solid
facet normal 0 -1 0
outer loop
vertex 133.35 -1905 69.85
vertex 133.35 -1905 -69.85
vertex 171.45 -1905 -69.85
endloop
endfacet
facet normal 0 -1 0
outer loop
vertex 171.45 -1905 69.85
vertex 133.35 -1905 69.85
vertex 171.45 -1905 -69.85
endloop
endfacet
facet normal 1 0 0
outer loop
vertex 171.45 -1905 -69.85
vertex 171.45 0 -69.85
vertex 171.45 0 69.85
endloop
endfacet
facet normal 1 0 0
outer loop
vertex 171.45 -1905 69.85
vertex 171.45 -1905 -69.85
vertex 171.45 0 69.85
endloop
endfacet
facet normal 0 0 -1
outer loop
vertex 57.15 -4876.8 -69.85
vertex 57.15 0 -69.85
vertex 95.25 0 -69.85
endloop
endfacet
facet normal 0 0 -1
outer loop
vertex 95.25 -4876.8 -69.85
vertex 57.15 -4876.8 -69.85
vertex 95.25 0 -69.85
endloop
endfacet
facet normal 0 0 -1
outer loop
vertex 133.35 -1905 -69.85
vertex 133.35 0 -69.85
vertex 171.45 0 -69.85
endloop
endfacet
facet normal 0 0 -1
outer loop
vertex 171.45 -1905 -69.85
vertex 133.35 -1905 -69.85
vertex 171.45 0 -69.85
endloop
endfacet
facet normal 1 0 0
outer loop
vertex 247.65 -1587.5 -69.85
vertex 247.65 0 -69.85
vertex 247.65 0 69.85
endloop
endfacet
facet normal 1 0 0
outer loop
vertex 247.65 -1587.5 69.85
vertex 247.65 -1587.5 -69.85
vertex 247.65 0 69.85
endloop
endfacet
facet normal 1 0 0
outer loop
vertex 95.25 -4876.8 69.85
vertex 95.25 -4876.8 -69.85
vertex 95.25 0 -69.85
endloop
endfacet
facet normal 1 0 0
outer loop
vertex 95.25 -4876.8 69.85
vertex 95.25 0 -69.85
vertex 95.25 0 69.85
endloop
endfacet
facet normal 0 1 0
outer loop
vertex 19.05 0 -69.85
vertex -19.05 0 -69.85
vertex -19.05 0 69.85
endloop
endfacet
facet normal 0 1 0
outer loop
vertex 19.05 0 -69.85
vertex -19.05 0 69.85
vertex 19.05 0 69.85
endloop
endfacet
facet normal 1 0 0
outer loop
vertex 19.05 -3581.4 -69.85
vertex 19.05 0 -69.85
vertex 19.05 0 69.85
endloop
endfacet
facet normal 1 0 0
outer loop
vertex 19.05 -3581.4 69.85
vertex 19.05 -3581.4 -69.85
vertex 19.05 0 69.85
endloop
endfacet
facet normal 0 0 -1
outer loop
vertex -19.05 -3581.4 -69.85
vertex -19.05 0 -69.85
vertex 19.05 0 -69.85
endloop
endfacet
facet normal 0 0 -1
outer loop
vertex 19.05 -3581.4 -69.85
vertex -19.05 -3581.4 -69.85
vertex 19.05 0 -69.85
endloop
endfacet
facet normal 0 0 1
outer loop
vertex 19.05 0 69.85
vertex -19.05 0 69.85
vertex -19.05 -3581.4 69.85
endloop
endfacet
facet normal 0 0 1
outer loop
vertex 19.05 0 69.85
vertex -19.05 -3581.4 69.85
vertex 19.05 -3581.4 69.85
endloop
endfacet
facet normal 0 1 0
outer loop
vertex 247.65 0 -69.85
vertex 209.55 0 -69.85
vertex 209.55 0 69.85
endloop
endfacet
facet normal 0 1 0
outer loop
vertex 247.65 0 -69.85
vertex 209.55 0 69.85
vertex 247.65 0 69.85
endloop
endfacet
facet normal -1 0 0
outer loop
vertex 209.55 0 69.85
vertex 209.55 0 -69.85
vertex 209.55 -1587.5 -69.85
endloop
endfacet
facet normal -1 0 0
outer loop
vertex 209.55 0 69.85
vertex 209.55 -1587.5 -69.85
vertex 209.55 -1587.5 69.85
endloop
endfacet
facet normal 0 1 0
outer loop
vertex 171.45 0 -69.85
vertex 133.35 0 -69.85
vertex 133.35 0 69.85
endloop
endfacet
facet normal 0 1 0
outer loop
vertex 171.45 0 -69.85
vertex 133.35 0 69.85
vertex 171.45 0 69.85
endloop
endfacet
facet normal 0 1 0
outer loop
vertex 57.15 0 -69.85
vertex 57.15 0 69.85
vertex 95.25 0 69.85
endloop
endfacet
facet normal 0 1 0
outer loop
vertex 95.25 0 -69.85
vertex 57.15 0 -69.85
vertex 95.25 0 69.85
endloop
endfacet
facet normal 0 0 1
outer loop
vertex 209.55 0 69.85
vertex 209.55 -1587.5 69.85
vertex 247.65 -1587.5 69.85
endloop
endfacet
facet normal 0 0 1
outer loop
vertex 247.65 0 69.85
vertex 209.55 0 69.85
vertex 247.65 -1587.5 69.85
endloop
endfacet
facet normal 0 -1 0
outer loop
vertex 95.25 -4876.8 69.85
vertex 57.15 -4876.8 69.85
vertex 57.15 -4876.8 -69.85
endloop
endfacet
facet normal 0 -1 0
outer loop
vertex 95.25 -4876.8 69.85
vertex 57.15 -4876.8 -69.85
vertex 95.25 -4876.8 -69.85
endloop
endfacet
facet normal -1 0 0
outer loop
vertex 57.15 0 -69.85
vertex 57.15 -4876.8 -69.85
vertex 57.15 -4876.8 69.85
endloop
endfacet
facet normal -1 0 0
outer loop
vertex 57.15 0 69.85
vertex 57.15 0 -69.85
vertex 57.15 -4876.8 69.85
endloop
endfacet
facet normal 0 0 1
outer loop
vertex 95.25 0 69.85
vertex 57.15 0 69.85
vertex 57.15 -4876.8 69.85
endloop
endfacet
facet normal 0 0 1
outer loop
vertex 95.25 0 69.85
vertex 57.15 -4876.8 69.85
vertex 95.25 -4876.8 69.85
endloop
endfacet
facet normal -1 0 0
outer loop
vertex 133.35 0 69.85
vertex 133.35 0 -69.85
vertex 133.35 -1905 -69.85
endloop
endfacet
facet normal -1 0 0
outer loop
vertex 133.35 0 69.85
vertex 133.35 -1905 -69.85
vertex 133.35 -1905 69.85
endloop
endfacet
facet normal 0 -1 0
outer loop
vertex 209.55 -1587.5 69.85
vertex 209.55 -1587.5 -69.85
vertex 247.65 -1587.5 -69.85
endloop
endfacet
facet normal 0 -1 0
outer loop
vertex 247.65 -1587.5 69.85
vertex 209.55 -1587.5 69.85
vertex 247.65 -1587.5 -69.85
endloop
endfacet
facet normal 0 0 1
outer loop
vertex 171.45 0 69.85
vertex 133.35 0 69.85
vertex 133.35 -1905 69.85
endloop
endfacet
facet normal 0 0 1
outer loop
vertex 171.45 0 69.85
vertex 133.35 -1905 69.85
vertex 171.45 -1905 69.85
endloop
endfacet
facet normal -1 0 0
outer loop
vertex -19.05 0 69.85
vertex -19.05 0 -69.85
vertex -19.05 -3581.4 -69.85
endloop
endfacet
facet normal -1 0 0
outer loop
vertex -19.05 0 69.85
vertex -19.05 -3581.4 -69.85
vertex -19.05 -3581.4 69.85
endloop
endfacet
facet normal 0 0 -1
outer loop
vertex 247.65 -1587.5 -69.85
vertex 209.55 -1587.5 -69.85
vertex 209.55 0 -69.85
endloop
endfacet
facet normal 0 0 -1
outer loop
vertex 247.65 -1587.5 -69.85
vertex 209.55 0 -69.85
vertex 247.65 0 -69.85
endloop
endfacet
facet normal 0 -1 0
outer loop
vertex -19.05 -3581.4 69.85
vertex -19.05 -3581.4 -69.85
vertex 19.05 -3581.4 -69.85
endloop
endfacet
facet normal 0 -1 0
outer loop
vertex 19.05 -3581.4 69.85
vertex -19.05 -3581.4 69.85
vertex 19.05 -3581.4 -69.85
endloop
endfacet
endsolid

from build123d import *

# Parameters (mm, degrees)
F0_W     = 38.1
F0_H     = 139.7
F1_DEPTH = 3581.4
F2_DEPTH = 4876.8
F3_DEPTH = 1905
F4_DEPTH = 1587.5


with BuildPart() as f1:
    # F0 (on Front) → F1 (new body)
    with BuildSketch(Plane.XZ):
        Rectangle(F0_W, F0_H)
    extrude(amount=F1_DEPTH)


with BuildPart() as f2:
    # F0 (on Front) → F2 (new body)
    with BuildSketch(Plane.XZ):
        with Locations((76.2, 0)):
            Rectangle(F0_W, F0_H)
    extrude(amount=F2_DEPTH)


with BuildPart() as f3:
    # F0 (on Front) → F3 (new body)
    with BuildSketch(Plane.XZ):
        with Locations((152.4, 0)):
            Rectangle(F0_W, F0_H)
    extrude(amount=F3_DEPTH)


with BuildPart() as f4:
    # F0 (on Front) → F4 (new body)
    with BuildSketch(Plane.XZ):
        with Locations((228.6, 0)):
            Rectangle(F0_W, F0_H)
    extrude(amount=F4_DEPTH)


solid = Compound([f1.part, f2.part, f3.part, f4.part])
